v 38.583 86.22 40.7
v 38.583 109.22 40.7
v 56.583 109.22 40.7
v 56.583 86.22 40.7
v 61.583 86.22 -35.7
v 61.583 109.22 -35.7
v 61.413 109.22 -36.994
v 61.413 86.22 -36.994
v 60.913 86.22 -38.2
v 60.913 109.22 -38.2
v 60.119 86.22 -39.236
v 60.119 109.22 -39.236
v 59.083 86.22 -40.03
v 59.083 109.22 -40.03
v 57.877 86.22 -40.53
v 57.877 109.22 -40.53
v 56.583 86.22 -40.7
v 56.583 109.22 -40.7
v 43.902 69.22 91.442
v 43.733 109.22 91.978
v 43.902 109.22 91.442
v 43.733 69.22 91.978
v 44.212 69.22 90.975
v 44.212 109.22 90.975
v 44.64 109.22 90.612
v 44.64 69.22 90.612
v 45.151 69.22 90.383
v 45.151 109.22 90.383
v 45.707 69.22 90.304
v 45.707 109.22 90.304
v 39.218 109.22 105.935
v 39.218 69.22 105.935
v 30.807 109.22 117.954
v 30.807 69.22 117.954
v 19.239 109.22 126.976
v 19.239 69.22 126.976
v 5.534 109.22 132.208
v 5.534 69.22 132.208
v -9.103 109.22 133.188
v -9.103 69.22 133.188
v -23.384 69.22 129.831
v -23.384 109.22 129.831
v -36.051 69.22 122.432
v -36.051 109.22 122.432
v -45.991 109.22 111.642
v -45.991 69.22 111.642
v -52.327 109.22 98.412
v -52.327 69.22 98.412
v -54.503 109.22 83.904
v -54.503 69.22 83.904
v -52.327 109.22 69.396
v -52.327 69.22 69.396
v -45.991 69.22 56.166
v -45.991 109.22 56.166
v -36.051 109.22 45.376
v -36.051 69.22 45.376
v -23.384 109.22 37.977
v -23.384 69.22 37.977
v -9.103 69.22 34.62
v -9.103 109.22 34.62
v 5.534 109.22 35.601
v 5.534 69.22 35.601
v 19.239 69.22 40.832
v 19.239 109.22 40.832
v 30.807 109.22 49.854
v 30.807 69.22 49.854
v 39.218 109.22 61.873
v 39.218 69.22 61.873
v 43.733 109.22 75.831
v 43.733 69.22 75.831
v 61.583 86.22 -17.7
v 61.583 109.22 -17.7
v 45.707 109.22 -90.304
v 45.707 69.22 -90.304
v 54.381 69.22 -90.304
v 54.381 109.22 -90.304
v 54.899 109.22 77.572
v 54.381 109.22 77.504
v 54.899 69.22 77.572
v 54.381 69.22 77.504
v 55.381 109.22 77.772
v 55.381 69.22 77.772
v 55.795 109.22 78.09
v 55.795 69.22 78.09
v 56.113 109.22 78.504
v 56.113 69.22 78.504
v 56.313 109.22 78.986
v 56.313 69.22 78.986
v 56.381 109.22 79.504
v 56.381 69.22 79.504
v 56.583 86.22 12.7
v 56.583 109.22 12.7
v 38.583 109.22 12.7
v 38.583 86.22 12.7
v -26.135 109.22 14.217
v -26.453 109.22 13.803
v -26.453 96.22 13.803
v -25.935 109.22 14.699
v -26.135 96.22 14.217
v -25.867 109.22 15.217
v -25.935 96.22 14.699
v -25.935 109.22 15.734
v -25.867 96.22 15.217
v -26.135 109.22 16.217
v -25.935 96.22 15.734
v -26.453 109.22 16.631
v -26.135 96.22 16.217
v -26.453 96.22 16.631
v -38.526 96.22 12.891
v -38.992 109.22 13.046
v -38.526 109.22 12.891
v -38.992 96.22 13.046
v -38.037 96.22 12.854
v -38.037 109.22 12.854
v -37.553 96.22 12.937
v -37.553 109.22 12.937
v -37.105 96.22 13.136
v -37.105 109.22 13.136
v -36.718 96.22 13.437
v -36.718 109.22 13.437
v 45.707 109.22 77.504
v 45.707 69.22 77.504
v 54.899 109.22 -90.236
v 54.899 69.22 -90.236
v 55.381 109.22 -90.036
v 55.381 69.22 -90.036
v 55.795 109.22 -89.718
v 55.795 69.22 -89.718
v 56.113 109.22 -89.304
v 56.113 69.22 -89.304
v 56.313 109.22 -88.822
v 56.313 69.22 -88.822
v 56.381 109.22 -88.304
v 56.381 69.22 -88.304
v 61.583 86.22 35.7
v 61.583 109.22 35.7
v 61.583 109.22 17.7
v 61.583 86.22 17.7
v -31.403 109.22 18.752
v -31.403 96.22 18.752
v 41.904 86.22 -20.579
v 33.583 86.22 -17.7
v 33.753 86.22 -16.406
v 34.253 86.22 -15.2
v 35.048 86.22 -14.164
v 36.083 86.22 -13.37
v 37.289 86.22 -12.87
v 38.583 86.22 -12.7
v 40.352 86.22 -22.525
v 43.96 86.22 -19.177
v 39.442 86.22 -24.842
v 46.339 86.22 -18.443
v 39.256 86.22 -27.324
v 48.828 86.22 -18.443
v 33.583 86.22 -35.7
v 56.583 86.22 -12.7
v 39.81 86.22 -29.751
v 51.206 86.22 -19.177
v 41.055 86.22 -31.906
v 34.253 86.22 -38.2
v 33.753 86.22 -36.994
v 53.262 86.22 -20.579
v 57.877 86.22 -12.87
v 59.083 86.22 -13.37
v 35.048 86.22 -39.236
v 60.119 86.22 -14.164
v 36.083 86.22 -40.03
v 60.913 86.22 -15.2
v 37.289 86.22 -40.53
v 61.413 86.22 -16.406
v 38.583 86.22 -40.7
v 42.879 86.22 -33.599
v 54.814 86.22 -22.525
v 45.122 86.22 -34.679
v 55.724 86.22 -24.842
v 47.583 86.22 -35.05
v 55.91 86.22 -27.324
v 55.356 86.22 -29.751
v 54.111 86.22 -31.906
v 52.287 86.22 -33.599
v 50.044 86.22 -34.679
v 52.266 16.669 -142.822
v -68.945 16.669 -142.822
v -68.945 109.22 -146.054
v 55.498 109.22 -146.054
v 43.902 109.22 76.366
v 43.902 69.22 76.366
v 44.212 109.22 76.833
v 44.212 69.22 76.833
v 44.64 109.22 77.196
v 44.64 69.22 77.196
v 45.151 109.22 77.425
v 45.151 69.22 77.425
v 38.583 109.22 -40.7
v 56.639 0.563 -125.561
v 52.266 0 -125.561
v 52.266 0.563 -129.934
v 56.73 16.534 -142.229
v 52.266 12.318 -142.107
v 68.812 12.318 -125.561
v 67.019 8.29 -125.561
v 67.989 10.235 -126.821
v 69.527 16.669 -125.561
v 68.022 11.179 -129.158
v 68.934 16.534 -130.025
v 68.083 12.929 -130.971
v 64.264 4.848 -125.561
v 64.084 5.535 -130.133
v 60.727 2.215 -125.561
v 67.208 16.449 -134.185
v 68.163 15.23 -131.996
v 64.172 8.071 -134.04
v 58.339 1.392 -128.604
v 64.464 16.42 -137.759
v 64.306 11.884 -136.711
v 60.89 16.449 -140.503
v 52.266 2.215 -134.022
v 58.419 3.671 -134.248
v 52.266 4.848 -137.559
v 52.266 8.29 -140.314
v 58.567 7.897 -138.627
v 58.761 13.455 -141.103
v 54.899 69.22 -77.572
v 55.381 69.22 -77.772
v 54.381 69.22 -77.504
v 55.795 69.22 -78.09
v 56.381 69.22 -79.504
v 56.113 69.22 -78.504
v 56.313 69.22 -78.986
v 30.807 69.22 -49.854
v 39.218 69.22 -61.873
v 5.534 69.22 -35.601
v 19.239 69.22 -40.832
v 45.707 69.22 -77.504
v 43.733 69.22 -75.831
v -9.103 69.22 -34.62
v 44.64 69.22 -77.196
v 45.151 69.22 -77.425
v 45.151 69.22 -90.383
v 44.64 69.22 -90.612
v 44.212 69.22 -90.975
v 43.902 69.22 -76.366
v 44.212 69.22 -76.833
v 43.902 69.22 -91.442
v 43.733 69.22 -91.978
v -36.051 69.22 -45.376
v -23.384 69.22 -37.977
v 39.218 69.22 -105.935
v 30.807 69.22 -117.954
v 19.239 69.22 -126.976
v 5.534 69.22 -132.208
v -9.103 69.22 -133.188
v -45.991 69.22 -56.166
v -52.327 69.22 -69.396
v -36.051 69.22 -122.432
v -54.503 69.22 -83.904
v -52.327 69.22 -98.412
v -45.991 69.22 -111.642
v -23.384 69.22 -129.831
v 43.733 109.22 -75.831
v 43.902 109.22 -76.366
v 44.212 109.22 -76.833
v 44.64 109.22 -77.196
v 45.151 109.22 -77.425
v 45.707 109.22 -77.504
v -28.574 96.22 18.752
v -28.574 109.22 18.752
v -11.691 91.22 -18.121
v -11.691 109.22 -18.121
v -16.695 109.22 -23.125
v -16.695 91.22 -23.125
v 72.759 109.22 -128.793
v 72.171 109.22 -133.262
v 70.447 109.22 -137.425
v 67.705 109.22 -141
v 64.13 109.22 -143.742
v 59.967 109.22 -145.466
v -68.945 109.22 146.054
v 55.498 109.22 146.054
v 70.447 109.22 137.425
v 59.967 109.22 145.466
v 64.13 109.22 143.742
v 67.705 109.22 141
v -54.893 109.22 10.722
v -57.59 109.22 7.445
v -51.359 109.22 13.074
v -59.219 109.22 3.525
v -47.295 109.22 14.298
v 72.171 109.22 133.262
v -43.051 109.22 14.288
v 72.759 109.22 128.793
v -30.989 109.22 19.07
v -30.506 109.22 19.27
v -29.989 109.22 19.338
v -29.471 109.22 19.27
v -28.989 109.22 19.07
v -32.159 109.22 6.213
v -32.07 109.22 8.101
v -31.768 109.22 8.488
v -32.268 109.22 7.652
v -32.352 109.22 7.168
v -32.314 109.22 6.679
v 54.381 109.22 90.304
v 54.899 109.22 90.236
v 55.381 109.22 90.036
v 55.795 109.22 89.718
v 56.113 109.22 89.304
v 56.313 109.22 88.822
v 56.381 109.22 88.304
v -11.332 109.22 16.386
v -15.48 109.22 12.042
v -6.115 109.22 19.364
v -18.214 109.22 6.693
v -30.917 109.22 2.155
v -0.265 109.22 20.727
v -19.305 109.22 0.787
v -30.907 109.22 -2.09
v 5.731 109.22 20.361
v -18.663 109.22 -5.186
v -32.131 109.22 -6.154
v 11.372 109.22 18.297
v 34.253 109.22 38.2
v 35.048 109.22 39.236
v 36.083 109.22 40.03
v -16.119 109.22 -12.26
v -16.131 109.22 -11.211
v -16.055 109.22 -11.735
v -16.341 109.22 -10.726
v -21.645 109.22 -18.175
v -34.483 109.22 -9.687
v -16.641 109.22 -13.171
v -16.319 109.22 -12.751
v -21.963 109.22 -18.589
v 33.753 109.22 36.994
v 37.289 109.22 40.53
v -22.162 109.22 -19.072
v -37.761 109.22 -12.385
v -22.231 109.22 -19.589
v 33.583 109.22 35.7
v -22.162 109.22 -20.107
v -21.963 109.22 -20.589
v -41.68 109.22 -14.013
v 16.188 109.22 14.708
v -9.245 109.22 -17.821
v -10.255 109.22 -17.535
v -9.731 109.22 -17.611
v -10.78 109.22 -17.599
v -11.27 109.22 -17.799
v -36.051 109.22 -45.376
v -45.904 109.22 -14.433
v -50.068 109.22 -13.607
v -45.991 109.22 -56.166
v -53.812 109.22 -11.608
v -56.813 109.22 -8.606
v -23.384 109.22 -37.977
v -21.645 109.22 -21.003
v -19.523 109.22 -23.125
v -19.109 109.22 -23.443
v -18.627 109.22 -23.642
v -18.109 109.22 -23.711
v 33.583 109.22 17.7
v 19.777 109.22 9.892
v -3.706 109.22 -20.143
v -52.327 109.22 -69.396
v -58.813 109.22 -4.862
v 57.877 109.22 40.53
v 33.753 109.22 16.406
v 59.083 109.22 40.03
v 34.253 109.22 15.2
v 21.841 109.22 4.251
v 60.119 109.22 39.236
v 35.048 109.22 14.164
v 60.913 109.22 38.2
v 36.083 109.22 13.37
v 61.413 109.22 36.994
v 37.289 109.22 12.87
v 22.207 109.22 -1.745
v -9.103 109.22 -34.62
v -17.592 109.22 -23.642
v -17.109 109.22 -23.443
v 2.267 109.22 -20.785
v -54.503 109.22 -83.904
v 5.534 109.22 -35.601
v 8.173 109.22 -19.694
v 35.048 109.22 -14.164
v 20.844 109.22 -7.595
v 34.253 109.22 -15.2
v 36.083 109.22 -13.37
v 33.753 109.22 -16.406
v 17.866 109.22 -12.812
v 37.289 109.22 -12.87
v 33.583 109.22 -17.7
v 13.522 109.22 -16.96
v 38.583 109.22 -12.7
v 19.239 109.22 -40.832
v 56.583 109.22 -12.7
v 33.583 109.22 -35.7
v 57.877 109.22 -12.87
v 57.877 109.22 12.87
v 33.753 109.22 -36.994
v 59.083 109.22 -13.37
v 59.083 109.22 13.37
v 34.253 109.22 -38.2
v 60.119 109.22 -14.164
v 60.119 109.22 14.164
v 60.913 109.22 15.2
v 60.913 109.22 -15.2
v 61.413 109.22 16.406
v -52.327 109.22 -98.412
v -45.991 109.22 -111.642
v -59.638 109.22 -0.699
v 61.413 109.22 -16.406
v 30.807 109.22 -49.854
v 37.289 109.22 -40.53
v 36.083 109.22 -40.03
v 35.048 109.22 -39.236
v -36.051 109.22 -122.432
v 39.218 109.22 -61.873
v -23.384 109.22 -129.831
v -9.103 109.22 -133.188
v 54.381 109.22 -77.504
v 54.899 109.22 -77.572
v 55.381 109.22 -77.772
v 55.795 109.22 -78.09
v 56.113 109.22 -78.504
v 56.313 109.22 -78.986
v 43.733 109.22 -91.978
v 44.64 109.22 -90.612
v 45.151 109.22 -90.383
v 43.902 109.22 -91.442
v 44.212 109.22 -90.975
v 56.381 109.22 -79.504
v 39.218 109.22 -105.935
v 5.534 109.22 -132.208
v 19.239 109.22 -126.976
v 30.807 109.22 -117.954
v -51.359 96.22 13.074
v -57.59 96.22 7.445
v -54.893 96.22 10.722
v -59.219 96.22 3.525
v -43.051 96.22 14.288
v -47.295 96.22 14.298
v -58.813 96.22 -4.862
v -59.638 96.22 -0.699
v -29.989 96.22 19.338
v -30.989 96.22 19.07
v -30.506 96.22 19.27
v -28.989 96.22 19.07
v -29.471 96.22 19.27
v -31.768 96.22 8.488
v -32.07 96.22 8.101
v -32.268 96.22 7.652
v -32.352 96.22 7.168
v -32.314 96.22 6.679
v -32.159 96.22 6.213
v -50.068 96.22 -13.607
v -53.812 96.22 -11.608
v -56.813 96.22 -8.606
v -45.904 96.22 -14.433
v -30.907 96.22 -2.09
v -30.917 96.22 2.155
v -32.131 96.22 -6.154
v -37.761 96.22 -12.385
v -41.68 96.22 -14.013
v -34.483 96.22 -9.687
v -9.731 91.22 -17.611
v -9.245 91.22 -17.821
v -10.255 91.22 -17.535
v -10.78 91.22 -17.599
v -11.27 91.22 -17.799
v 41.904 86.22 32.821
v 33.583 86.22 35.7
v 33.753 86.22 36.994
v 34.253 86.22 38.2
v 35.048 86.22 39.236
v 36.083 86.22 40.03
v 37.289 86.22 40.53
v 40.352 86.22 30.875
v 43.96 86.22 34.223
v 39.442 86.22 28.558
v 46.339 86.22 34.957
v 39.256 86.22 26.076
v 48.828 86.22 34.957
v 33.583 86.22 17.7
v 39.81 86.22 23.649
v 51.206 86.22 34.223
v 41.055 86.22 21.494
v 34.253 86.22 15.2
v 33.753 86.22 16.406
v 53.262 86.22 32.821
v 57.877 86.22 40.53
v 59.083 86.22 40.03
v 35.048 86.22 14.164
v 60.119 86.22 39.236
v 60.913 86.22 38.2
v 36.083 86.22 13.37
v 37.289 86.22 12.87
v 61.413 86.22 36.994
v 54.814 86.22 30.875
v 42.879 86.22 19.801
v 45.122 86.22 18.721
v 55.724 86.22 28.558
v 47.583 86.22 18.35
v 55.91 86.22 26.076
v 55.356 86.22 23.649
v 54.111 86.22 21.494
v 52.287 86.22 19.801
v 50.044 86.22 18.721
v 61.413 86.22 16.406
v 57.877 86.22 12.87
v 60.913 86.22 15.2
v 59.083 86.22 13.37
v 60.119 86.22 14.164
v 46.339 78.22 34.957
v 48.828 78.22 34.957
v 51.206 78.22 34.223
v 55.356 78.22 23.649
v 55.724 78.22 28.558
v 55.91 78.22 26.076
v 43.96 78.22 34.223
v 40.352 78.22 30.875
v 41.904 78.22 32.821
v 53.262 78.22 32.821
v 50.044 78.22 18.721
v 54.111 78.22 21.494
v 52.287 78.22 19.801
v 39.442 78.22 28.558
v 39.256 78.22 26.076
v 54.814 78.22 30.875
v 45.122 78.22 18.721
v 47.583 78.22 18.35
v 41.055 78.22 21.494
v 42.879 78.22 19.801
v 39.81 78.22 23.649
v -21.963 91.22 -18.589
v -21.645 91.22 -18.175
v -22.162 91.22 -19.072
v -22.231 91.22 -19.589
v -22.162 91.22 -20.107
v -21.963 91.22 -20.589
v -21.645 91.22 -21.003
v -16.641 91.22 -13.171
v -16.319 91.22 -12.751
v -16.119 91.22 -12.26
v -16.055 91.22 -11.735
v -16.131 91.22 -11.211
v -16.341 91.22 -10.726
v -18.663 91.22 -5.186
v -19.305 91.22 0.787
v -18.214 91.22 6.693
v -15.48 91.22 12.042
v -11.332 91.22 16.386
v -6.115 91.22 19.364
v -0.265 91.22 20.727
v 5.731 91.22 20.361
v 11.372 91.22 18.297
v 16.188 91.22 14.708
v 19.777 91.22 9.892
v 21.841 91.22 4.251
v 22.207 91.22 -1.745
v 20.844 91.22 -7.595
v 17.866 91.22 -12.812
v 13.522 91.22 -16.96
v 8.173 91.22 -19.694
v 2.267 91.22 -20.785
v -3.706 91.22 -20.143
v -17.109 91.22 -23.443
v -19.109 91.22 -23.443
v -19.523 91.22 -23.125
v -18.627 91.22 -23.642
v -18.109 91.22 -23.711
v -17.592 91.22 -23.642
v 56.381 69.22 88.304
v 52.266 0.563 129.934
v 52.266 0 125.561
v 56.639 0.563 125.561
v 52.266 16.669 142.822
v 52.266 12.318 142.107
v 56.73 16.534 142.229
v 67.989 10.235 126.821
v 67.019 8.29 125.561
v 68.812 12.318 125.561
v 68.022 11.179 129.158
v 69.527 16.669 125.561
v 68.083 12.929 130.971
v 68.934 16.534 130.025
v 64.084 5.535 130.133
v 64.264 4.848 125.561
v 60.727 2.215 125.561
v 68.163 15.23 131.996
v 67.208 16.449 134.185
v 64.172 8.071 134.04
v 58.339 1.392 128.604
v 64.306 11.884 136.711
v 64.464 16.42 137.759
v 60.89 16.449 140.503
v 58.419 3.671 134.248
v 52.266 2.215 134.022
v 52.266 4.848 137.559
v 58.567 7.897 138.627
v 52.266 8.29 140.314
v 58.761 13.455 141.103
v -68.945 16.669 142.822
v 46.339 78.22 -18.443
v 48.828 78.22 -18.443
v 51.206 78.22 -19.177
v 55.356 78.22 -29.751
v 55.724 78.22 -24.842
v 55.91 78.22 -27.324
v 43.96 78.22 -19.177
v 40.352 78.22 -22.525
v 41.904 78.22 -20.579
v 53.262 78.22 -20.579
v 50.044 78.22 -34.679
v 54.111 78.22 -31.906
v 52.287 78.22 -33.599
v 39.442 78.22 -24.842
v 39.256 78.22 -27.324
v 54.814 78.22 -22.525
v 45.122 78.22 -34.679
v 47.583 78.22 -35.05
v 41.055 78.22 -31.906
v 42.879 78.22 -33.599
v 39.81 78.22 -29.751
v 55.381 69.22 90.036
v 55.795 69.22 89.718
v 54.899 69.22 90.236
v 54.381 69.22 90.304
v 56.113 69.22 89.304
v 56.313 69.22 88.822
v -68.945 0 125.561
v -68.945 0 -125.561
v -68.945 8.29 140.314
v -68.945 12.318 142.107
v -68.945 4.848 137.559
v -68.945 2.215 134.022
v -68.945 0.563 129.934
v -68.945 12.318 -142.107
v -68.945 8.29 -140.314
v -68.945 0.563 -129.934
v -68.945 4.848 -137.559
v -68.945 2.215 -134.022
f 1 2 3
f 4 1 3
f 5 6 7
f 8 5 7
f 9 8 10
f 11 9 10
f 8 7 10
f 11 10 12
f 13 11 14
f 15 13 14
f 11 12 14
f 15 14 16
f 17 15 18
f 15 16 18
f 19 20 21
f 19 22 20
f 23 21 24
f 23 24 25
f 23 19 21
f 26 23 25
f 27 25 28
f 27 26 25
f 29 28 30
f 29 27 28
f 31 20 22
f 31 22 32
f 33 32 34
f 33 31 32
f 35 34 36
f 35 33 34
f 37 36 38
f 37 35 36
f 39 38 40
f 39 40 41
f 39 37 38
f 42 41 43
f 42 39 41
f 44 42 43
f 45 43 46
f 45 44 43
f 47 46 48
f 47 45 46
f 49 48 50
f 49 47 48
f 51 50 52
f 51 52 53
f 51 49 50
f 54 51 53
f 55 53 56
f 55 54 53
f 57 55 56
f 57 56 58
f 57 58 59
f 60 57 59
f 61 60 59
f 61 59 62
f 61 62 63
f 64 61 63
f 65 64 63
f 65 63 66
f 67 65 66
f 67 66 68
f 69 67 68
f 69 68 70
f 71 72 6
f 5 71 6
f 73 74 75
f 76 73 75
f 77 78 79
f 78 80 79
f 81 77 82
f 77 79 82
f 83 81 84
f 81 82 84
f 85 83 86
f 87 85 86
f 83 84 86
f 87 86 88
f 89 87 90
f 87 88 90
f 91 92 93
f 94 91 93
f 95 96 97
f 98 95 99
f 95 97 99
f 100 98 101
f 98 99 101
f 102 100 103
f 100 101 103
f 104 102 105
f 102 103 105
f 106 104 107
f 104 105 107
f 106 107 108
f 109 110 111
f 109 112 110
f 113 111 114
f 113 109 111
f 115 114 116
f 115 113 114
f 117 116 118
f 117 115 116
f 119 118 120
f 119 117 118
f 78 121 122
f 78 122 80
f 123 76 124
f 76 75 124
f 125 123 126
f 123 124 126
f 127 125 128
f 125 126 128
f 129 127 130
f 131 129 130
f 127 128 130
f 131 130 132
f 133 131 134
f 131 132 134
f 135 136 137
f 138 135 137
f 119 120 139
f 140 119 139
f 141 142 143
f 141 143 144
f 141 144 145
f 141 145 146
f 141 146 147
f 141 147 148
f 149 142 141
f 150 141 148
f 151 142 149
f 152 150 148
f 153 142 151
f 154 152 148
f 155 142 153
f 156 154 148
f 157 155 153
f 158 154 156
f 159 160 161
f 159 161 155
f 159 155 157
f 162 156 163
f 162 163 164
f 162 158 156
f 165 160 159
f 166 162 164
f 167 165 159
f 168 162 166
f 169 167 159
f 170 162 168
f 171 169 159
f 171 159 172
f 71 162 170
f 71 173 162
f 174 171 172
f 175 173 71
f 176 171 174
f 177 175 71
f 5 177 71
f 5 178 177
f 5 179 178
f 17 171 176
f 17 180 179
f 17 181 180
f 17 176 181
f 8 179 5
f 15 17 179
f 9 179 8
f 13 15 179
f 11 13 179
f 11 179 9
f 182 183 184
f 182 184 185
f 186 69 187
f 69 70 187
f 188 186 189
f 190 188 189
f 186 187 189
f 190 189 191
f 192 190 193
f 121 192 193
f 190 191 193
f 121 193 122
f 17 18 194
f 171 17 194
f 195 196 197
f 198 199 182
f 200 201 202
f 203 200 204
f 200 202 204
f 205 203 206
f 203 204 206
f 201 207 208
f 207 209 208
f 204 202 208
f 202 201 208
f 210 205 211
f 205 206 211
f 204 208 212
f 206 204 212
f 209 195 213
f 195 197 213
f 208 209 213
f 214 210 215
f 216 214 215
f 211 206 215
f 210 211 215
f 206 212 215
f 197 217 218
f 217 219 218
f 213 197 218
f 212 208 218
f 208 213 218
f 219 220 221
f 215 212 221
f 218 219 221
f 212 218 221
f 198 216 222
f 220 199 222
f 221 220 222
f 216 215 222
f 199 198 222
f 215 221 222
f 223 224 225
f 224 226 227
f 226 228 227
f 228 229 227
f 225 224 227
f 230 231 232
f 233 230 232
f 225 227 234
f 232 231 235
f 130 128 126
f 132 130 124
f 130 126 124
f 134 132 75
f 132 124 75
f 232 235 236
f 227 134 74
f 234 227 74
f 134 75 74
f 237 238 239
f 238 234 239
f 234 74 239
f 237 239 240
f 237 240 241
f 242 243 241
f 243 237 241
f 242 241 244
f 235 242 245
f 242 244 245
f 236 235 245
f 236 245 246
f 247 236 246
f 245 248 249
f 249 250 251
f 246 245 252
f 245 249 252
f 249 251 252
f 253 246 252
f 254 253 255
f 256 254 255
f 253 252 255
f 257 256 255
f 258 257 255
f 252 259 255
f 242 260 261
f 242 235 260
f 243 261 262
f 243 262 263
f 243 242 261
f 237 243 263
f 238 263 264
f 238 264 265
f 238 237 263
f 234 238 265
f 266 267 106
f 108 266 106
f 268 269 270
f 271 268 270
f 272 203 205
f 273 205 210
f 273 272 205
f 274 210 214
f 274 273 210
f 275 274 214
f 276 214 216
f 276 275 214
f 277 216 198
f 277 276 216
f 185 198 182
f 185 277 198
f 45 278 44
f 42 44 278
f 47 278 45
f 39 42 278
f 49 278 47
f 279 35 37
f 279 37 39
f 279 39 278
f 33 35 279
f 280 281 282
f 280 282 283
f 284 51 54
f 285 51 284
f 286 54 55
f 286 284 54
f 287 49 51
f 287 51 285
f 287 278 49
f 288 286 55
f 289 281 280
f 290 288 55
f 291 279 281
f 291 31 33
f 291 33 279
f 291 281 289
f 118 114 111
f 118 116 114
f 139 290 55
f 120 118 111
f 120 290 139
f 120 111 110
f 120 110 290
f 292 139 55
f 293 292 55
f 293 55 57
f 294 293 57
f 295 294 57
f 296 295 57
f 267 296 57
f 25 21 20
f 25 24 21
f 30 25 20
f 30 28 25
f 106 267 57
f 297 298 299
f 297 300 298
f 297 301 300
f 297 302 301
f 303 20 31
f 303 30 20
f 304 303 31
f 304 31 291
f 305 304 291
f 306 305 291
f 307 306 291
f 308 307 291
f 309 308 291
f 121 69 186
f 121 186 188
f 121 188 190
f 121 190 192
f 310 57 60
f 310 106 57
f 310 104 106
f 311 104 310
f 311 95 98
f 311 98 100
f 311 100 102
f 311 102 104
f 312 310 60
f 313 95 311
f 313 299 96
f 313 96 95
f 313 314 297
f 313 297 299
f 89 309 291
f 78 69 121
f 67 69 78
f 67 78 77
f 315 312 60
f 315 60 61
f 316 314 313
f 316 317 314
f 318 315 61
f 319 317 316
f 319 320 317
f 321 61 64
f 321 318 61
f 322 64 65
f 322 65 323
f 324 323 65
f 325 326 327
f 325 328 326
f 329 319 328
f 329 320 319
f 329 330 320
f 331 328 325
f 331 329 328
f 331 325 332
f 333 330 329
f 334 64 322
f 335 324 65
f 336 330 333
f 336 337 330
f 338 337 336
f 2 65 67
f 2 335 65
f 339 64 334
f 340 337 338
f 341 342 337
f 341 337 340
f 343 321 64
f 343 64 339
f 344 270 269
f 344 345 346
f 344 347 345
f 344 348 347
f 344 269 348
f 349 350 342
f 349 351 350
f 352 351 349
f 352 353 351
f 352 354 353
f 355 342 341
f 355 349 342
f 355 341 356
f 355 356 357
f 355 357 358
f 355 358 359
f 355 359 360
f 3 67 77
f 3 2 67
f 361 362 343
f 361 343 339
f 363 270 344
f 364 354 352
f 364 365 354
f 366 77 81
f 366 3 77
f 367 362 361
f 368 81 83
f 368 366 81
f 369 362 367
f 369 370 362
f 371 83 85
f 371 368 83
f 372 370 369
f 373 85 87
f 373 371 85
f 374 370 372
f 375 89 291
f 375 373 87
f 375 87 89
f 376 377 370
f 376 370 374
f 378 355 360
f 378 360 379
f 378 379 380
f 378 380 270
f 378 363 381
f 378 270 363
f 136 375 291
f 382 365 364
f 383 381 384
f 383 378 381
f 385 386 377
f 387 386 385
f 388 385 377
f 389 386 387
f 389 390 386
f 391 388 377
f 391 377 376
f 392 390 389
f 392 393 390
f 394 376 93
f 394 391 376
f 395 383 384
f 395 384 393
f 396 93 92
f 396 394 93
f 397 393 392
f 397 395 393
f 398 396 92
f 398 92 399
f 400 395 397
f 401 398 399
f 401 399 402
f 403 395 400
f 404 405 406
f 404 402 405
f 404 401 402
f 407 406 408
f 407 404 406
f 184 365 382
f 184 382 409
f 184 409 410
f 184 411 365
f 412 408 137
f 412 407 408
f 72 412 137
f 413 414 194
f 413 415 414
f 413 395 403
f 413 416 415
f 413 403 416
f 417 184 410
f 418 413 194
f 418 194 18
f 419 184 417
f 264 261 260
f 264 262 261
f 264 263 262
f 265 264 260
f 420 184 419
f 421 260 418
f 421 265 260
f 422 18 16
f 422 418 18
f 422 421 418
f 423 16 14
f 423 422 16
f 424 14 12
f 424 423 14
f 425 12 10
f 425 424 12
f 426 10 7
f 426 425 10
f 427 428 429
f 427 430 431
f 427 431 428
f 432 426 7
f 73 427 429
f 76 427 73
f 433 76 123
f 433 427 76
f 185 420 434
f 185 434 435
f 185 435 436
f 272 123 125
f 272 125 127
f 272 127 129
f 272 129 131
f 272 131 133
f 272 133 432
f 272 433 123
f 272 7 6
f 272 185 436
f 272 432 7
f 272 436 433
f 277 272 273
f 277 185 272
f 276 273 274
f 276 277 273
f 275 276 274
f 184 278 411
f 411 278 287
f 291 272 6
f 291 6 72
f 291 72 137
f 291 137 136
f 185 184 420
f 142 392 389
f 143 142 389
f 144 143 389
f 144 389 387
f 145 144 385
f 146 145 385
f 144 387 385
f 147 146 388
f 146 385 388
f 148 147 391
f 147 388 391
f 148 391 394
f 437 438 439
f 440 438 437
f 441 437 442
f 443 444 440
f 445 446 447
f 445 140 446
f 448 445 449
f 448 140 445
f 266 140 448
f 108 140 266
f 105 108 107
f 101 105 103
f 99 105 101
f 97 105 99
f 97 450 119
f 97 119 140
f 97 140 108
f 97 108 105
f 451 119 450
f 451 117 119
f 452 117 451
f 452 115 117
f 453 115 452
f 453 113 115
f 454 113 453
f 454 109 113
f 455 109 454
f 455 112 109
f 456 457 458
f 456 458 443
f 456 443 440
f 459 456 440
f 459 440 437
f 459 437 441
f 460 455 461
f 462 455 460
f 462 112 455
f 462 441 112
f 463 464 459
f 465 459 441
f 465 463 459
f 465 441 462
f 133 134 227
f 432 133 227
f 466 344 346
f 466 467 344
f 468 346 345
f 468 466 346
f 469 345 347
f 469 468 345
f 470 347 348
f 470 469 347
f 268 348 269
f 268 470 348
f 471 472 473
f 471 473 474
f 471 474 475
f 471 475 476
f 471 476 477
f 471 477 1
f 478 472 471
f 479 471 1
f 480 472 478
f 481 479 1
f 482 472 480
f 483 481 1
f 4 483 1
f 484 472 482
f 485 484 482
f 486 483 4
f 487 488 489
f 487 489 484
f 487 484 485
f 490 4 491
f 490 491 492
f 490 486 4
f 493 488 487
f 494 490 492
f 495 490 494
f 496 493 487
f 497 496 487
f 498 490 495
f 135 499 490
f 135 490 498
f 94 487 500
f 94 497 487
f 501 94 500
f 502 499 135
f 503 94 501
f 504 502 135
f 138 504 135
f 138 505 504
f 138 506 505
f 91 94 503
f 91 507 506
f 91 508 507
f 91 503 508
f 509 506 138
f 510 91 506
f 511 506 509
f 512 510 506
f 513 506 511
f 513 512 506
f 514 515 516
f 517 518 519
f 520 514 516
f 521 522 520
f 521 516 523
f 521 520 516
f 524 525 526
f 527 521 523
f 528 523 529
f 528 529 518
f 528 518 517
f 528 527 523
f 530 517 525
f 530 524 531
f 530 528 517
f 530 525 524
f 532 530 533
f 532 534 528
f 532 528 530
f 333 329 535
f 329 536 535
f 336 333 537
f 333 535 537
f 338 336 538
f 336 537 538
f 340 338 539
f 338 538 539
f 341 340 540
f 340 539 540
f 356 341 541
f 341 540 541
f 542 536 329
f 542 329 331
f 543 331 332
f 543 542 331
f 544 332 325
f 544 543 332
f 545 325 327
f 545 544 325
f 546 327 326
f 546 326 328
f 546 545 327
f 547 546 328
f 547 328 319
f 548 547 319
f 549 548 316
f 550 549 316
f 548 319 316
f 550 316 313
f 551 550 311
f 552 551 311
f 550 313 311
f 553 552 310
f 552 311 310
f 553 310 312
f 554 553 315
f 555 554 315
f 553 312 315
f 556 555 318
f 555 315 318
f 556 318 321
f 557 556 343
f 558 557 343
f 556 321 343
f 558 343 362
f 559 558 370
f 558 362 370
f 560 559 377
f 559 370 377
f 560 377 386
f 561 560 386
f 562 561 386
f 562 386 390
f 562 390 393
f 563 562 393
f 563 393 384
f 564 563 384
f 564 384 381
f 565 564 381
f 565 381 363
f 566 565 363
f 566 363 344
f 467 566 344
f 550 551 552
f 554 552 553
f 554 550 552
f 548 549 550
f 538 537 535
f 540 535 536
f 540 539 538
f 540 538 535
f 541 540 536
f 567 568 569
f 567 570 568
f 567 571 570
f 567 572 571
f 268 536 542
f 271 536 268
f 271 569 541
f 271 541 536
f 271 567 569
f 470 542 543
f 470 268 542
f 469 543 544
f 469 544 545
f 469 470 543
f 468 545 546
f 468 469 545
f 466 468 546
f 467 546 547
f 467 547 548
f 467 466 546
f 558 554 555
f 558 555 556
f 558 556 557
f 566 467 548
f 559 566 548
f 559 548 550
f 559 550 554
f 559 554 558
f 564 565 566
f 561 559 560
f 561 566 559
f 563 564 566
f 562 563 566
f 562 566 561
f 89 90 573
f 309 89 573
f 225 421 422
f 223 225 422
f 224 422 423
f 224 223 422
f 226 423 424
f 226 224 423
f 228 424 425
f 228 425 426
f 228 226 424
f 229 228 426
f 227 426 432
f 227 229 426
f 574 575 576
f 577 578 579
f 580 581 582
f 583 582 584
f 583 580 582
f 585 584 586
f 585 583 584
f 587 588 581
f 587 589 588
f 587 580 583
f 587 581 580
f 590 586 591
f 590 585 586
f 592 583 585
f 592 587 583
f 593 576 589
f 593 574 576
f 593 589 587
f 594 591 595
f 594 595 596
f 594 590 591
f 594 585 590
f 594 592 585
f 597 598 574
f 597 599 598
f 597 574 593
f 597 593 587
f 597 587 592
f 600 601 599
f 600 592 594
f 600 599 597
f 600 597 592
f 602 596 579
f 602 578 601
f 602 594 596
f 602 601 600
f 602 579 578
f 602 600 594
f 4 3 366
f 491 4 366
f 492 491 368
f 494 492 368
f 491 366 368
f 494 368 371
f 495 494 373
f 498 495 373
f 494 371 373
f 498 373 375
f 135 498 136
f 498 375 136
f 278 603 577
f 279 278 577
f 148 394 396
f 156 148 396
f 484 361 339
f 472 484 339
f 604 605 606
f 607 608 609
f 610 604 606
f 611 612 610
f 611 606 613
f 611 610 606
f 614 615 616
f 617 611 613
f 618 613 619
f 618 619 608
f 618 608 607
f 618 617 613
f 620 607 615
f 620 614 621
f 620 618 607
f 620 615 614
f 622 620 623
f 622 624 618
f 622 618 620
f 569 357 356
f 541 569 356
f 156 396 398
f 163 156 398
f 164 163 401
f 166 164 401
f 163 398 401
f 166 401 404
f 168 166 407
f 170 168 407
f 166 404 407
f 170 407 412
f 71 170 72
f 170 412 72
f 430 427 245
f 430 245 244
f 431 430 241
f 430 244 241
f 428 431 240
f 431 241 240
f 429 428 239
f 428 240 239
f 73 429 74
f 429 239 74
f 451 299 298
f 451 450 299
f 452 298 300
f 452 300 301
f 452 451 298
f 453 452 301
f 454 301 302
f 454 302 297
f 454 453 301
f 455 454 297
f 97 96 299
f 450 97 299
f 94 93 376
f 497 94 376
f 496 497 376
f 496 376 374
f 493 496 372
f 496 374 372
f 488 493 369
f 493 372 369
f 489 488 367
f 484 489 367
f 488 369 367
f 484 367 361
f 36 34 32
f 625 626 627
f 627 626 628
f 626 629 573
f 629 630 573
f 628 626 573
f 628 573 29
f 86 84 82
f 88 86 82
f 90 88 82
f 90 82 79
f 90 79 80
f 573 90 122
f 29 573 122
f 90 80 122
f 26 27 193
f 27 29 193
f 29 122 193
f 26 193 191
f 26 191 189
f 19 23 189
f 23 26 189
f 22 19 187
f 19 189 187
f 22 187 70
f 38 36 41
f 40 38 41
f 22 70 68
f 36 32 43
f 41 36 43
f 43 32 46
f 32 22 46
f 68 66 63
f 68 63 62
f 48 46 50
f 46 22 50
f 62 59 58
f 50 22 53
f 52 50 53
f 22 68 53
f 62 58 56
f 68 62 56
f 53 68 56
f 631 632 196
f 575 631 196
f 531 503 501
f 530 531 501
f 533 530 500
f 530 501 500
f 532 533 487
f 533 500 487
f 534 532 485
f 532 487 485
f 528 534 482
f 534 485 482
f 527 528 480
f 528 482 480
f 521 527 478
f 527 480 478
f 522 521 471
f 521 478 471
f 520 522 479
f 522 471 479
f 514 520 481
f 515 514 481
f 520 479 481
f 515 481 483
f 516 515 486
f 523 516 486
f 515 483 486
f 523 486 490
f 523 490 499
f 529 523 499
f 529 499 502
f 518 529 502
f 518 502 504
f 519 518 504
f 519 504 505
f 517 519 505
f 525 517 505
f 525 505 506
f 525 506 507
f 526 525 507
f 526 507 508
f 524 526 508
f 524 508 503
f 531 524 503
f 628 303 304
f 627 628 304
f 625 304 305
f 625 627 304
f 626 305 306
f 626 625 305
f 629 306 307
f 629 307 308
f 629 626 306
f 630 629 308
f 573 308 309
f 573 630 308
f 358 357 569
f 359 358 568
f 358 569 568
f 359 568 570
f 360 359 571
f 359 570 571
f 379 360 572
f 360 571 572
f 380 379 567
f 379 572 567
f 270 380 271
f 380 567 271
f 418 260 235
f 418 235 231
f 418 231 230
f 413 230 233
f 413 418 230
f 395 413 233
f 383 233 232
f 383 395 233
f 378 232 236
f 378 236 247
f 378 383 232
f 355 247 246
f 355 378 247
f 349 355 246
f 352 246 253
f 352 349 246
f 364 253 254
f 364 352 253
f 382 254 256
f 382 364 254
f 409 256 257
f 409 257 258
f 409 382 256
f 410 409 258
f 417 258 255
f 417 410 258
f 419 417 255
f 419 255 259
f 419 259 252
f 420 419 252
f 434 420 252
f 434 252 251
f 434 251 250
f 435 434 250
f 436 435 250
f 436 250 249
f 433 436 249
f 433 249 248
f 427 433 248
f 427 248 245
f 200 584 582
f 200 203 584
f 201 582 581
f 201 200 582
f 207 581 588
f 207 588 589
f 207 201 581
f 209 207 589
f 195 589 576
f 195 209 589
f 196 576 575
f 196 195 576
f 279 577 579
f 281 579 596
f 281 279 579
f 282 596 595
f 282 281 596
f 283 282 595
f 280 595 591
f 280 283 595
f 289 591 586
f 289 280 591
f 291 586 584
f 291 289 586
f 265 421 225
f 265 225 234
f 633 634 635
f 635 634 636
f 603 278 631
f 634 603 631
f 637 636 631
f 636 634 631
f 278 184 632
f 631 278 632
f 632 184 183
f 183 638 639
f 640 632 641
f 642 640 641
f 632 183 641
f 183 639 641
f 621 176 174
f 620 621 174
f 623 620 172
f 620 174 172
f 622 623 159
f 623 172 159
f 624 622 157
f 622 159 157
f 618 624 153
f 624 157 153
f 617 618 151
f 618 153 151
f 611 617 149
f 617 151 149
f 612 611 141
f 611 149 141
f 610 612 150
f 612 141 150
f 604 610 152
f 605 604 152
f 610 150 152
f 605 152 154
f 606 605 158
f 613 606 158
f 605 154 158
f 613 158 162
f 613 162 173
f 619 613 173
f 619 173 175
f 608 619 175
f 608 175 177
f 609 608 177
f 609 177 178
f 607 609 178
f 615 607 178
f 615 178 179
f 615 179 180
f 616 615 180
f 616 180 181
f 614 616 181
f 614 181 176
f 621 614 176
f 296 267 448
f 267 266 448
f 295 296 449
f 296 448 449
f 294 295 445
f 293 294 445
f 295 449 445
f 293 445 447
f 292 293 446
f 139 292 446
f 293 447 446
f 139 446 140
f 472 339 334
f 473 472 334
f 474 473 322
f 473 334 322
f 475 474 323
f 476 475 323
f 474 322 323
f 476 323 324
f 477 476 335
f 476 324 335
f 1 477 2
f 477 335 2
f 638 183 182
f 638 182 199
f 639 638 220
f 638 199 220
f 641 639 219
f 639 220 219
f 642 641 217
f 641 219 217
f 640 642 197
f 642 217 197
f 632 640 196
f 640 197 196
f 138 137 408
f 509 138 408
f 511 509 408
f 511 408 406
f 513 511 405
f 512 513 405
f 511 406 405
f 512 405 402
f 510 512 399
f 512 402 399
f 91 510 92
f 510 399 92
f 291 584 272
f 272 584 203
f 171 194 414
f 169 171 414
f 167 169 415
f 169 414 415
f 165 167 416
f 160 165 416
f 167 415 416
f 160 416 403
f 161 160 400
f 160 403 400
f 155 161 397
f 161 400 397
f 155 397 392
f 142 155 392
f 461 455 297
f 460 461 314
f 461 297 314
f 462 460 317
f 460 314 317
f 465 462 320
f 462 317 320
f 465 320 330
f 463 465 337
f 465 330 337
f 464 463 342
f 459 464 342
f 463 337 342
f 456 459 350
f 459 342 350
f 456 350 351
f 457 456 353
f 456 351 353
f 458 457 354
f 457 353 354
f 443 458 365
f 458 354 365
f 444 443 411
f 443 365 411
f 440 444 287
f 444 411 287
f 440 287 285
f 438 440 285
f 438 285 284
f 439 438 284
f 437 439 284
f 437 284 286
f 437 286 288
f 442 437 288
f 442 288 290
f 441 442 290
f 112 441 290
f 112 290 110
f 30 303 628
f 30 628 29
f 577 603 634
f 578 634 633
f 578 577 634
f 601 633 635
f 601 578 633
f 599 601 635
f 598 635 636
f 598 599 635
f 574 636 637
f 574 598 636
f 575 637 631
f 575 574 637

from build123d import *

# Parameters (mm, degrees)
SKETCH3_W               = 137.89
SKETCH3_H               = 284.48
BOSS_EXTRUDE1_DEPTH     = 109.22
BOSS_EXTRUDE1_DRAFT     = -2
FILLET1_R               = 17.272
CUT_EXTRUDE1_START      = 109.22
CUT_EXTRUDE1_DEPTH      = 40
CUT_EXTRUDE2_START      = 109.22
CUT_EXTRUDE2_DEPTH      = 13
CUT_EXTRUDE3_START      = 109.22
CUT_EXTRUDE3_DEPTH      = 18
CUT_EXTRUDE5_START      = 109.22
SKETCH1_6_R             = 8.35
CUT_EXTRUDE5_DEPTH      = 23
CUT_EXTRUDE7_START      = 109.22
SKETCH1_7_R             = 8.35
CUT_EXTRUDE7_DEPTH      = 31
FILLET2_R               = 2
CUT_EXTRUDE8_DEPTH      = 197.353435728
CUT_EXTRUDE8_DEPTH_BACK = 197.353435728


with BuildPart() as part:
    # Sketch3 → Boss-Extrude1 (with draft: the straight prism first)
    with BuildSketch(Plane(origin=(0, 0, 0), x_dir=(1, 0, 0), z_dir=(0, 1, 0))):
        Rectangle(SKETCH3_W, SKETCH3_H)
    extrude(amount=BOSS_EXTRUDE1_DEPTH)
    # Boss-Extrude1: the draft: its side faces are tilted about the plane it starts from
    boss_extrude1_sides = [part.faces().sort_by_distance(p)[0] for p in [
        (0, 54.61, 142.24),
        (68.945, 54.61, 0),
        (0, 54.61, -142.24),
        (-68.945, 54.61, 0),
    ]]
    draft(boss_extrude1_sides, Plane(origin=(0, 0, 0), x_dir=(1, 0, 0), z_dir=(0, 1, 0)), BOSS_EXTRUDE1_DRAFT)

    # Fillet1
    fillet1_edges = [part.edges().sort_by_distance(p)[0] for p in [
        (0, 0, 142.24),
        (0, 0, -142.24),
        (68.945, 0, 0),
        (70.852023222, 54.61, 144.147023222),
        (70.852023222, 54.61, -144.147023222),
    ]]
    fillet(fillet1_edges, radius=FILLET1_R)

    # Sketch1 → Cut-Extrude1 (cut)
    with BuildSketch(Plane(origin=(0, 0, 0), x_dir=(1, 0, 0), z_dir=(0, 1, 0)).offset(CUT_EXTRUDE1_START)):
        with BuildLine():
            Line((43.981048837, 90.304046444), (56.381048837, 90.304046444))
            Line((56.381048837, 90.304046444), (56.381048837, 77.504046444))
            Line((56.381048837, 77.504046444), (43.981048837, 77.504046444))
            ThreePointArc((43.981048837, 77.504046444), (-54.503046444, 83.904046444), (43.981048837, 90.304046444))
        make_face()
        with BuildLine():
            Line((43.981048837, -77.504046444), (56.381048837, -77.504046444))
            Line((56.381048837, -77.504046444), (56.381048837, -90.304046444))
            Line((56.381048837, -90.304046444), (43.981048837, -90.304046444))
            ThreePointArc((43.981048837, -90.304046444), (-54.503046444, -83.904046444), (43.981048837, -77.504046444))
        make_face()
    extrude(amount=-CUT_EXTRUDE1_DEPTH, mode=Mode.SUBTRACT)

    # Sketch1<4> → Cut-Extrude2 (cut)
    with BuildSketch(Plane(origin=(0, 0, 0), x_dir=(1, 0, 0), z_dir=(0, 1, 0)).offset(CUT_EXTRUDE2_START)):
        with BuildLine():
            Line((-25.038870367, -15.216738709), (-32.81704496, -7.438564116))
            ThreePointArc((-32.81704496, -7.438564116), (-55.423049532, 10.217692988), (-37.766792428, -12.388311584))
            Line((-37.766792428, -12.388311584), (-29.988617835, -20.166486177))
            Line((-29.988617835, -20.166486177), (-25.038870367, -15.216738709))
        make_face()
    extrude(amount=-CUT_EXTRUDE2_DEPTH, mode=Mode.SUBTRACT)

    # Sketch1<5> → Cut-Extrude3 (cut)
    with BuildSketch(Plane(origin=(0, 0, 0), x_dir=(1, 0, 0), z_dir=(0, 1, 0)).offset(CUT_EXTRUDE3_START)):
        with BuildLine():
            Line((-23.058973173, 19.589272149), (-15.492930614, 12.02322959))
            ThreePointArc((-15.492930614, 12.02322959), (16.187867493, -14.707821049), (-10.543183146, 16.972977058))
            Line((-10.543183146, 16.972977058), (-18.109225705, 24.539019617))
            Line((-18.109225705, 24.539019617), (-23.058973173, 19.589272149))
        make_face()
    extrude(amount=-CUT_EXTRUDE3_DEPTH, mode=Mode.SUBTRACT)

    # Sketch1<6> → Cut-Extrude5 (cut)
    # profile 1 of 2: a face of its own
    with BuildSketch(Plane(origin=(0, 0, 0), x_dir=(1, 0, 0), z_dir=(0, 1, 0)).offset(CUT_EXTRUDE5_START)):
        with BuildLine():
            Line((38.583046444, 12.7), (56.583046444, 12.7))
            ThreePointArc((56.583046444, 12.7), (60.11858035, 14.164466094), (61.583046444, 17.7))
            Line((61.583046444, 17.7), (61.583046444, 35.7))
            ThreePointArc((61.583046444, 35.7), (60.11858035, 39.235533906), (56.583046444, 40.7))
            Line((56.583046444, 40.7), (38.583046444, 40.7))
            ThreePointArc((38.583046444, 40.7), (35.047512538, 39.235533906), (33.583046444, 35.7))
            Line((33.583046444, 35.7), (33.583046444, 17.7))
            ThreePointArc((33.583046444, 17.7), (35.047512538, 14.164466094), (38.583046444, 12.7))
        make_face()
        with Locations(Location((47.583046444, 26.7, 0), (0, 0, 90))):
            Circle(SKETCH1_6_R, mode=Mode.SUBTRACT)
    # profile 2 of 2: a face of its own
    with BuildSketch(Plane(origin=(0, 0, 0), x_dir=(1, 0, 0), z_dir=(0, 1, 0)).offset(CUT_EXTRUDE5_START)):
        with BuildLine():
            Line((38.583046444, -40.7), (56.583046444, -40.7))
            ThreePointArc((56.583046444, -40.7), (60.11858035, -39.235533906), (61.583046444, -35.7))
            Line((61.583046444, -35.7), (61.583046444, -17.7))
            ThreePointArc((61.583046444, -17.7), (60.11858035, -14.164466094), (56.583046444, -12.7))
            Line((56.583046444, -12.7), (38.583046444, -12.7))
            ThreePointArc((38.583046444, -12.7), (35.047512538, -14.164466094), (33.583046444, -17.7))
            Line((33.583046444, -17.7), (33.583046444, -35.7))
            ThreePointArc((33.583046444, -35.7), (35.047512538, -39.235533906), (38.583046444, -40.7))
        make_face()
        with Locations(Location((47.583046444, -26.7, 0), (0, 0, 90))):
            Circle(SKETCH1_6_R, mode=Mode.SUBTRACT)
    extrude(amount=-CUT_EXTRUDE5_DEPTH, mode=Mode.SUBTRACT)

    # Sketch1<7> → Cut-Extrude7 (cut)
    with BuildSketch(Plane(origin=(0, 0, 0), x_dir=(1, 0, 0), z_dir=(0, 1, 0)).offset(CUT_EXTRUDE7_START)):
        with Locations(Location((47.583046444, 26.7, 0), (0, 0, 90))):
            Circle(SKETCH1_7_R)
        with Locations(Location((47.583046444, -26.7, 0), (0, 0, 90))):
            Circle(SKETCH1_7_R)
    extrude(amount=-CUT_EXTRUDE7_DEPTH, mode=Mode.SUBTRACT)

    # Fillet2
    fillet2_edges = [part.edges().sort_by_distance(p)[0] for p in [
        (43.981048837, 89.22, -77.504046444),
        (43.981048837, 89.22, -90.304046444),
        (56.381048837, 89.22, -90.304046444),
        (56.381048837, 89.22, -77.504046444),
        (43.981048837, 89.22, 90.304046444),
        (43.981048837, 89.22, 77.504046444),
        (56.381048837, 89.22, 77.504046444),
        (56.381048837, 89.22, 90.304046444),
        (-25.038870367, 102.72, 15.216738709),
        (-29.988617835, 102.72, 20.166486177),
        (-37.766792428, 102.72, 12.388311584),
        (-32.81704496, 102.72, 7.438564116),
        (-23.058973173, 100.22, -19.589272149),
        (-18.109225705, 100.22, -24.539019617),
        (-10.543183146, 100.22, -16.972977058),
        (-15.492930614, 100.22, -12.02322959),
    ]]
    fillet(fillet2_edges, radius=FILLET2_R)

    # Sketch4 → Cut-Extrude8 (cut, two sides: drawn at the far end of the back side and taken through both)
    with BuildSketch(Plane.XY.offset(-CUT_EXTRUDE8_DEPTH_BACK)):
        Polygon((-68.945, 109.22), (-68.945, 0), (-84.208745504, 109.22), align=None)
    extrude(amount=CUT_EXTRUDE8_DEPTH + CUT_EXTRUDE8_DEPTH_BACK, mode=Mode.SUBTRACT)


solid = part.part
